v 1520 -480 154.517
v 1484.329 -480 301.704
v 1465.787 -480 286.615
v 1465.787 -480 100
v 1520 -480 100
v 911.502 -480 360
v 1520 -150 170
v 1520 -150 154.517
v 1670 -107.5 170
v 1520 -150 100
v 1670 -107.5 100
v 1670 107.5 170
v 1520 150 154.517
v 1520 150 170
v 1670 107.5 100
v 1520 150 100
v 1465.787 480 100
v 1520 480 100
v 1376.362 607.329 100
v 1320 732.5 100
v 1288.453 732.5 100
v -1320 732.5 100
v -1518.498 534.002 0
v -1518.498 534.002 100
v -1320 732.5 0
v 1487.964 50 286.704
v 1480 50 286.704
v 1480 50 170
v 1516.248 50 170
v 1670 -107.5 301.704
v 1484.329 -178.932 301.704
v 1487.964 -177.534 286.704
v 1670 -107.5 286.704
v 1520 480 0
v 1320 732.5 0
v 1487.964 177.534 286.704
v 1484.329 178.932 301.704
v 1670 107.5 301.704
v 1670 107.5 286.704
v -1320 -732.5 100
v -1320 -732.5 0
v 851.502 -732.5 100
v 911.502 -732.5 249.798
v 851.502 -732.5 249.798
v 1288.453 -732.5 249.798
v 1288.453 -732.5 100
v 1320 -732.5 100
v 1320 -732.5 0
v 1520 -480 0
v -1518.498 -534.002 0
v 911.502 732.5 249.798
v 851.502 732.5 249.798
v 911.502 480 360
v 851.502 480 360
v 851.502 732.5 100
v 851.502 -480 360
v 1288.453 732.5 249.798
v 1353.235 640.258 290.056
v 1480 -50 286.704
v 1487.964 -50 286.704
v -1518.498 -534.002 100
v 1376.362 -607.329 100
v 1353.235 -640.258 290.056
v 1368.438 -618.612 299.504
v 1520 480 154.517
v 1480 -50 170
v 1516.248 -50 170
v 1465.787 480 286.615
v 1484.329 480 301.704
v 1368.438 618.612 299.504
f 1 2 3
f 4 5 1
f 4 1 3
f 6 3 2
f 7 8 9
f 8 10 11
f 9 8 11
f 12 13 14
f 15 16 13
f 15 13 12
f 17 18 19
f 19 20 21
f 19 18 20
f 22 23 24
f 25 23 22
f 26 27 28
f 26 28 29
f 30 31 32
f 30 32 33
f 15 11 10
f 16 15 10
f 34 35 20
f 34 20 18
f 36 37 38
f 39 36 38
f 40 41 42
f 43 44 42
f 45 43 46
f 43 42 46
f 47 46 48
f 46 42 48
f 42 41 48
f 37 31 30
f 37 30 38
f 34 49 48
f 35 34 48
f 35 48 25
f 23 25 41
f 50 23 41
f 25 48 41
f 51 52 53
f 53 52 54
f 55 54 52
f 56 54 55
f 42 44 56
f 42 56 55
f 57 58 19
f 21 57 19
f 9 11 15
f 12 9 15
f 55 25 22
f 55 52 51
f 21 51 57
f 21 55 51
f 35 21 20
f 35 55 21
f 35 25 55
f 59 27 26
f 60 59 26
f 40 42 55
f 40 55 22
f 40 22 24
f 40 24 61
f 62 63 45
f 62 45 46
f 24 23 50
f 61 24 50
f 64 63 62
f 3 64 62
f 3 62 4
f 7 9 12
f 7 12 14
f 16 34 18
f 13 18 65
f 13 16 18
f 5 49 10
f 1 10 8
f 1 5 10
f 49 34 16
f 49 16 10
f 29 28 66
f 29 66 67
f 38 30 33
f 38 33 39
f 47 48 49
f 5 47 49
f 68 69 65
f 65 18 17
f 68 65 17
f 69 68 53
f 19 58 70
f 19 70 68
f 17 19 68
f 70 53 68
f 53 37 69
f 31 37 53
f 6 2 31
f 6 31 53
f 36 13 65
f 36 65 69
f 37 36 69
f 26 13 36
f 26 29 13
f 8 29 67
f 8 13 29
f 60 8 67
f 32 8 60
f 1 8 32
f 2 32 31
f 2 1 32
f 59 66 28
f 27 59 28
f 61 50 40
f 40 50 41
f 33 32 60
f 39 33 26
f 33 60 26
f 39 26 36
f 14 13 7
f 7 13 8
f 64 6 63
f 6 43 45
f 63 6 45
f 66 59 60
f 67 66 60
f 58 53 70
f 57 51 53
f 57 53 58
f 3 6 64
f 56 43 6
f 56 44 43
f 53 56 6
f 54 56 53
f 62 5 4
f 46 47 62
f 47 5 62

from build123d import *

# Parameters (mm, degrees)
BOSS_EXTRUDE1_DEPTH = 100
BOSS_EXTRUDE2_DEPTH = 30
BOSS_EXTRUDE3_DEPTH = 480
BOSS_EXTRUDE6_DEPTH = 70
BOSS_EXTRUDE7_DEPTH = 15
BOSS_EXTRUDE8_DEPTH = 252.5
BOSS_EXTRUDE9_REACH = 262
SKETCH15_W          = 587.219841395
SKETCH15_H          = 796.289062858
CUT_EXTRUDE1_DEPTH  = 400
SKETCH17_W          = 242.752536278
SKETCH17_H          = 431.304427501
CUT_EXTRUDE2_DEPTH  = 150
SKETCH18_W          = 4260.921249802
SKETCH18_H          = 1605.776736753
CUT_EXTRUDE3_DEPTH  = 1872
SKETCH19_W          = 40
SKETCH19_H          = 100
CUT_EXTRUDE4_DEPTH  = 116.703964


with BuildPart() as part:
    # Sketch1 → Boss-Extrude1 (new body)
    with BuildSketch(Plane.XY):
        Polygon((-1320, -732.5), (-1518.49827194, -534.00172806), (-1518.49827194, 534.00172806), (-1320, 732.5), (1320, 732.5), (1520, 480), (1520, -480), (1320, -732.5), align=None)
    extrude(amount=BOSS_EXTRUDE1_DEPTH)

    # Sketch2 → Boss-Extrude2 (add, symmetric)
    with BuildSketch(Plane.ZY.offset(-881.50172806)):
        Polygon((100, 732.5), (249.797915184, 732.5), (360, 480), (360, -480), (249.797915184, -732.5), (100, -732.5), align=None)
    extrude(amount=BOSS_EXTRUDE2_DEPTH, both=True)

    # Sketch3 → Boss-Extrude3 (add, symmetric)
    with BuildSketch(Plane(origin=(0, 0, 0), x_dir=(1, 0, 0), z_dir=(0, 1, 0))):
        Polygon((1520, -100), (1520, -154.516976287), (1484.328596942, -301.703964205), (911.50172806, -360), (911.50172806, -100), align=None)
    extrude(amount=BOSS_EXTRUDE3_DEPTH, both=True)

    # Sketch10 → Boss-Extrude6 (add)
    with BuildSketch(Plane.XY.offset(100)):
        Polygon((1520, 150), (1670, 107.5), (1670, -107.5), (1520, -150), align=None)
    extrude(amount=BOSS_EXTRUDE6_DEPTH)

    # Sketch11 → Boss-Extrude7 (add)
    with BuildSketch(Plane(origin=(0, 0, 301.703964205), x_dir=(0, -1, 0), z_dir=(0, 0, -1))):
        Polygon((-178.932312311, -1484.328596942), (-107.5, -1670), (107.5, -1670), (159.754145476, -1484.328596942), align=None)
    extrude(amount=BOSS_EXTRUDE7_DEPTH)

    # Sketch14 → Boss-Extrude8 (add)
    with BuildSketch(Plane(origin=(0, 732.5, 0), x_dir=(1, 0, 0), z_dir=(0, 1, 0))):
        Polygon((911.50172806, -100), (911.50172806, -360), (1351.817776589, -301.703964205), (1376.361738529, -100), align=None)
    extrude(amount=-BOSS_EXTRUDE8_DEPTH)

    # Boss-Extrude9: up to this face of the body (flat: up to its plane)
    boss_extrude9_end = Plane(part.part.faces().sort_by_distance((1131.659752325, 606.25, 330.851982103))[0])
    # Sketch16 → Boss-Extrude9 (add, up to the picked face)
    with BuildSketch(Plane.XY.offset(100), mode=Mode.PRIVATE) as boss_extrude9_sk1:
        Polygon((1329.450960679, 674.123815603), (1465.786632852, 480), (1329.450960679, 480), align=None)
    boss_extrude9_tool1 = split(extrude(boss_extrude9_sk1.sketch, amount=BOSS_EXTRUDE9_REACH, mode=Mode.PRIVATE), bisect_by=boss_extrude9_end, keep=Keep.BOTH, mode=Mode.PRIVATE)
    add(boss_extrude9_tool1.solids().sort_by_distance((1374.896185, 544.707939, 100))[0])

    # Sketch15 → Cut-Extrude1 (cut)
    with BuildSketch(Plane(origin=(0, 208.782250156, 478.371332562), x_dir=(1, 0, 0), z_dir=(0, 0.400006251, 0.916512411))):
        with Locations((1205.111648758, 435.889549234)):
            Rectangle(SKETCH15_W, SKETCH15_H)
    extrude(amount=CUT_EXTRUDE1_DEPTH, mode=Mode.SUBTRACT)

    # Sketch17 → Cut-Extrude2 (cut)
    with BuildSketch(Plane(origin=(1207.369633426, 847.951344984, 0), x_dir=(0, 0, -1), z_dir=(0.818341703, 0.574731987, 0))):
        with Locations((-221.376268139, -212.999290638)):
            Rectangle(SKETCH17_W, SKETCH17_H)
    extrude(amount=CUT_EXTRUDE2_DEPTH, mode=Mode.SUBTRACT)

    # Sketch18 → Cut-Extrude3 (cut)
    with BuildSketch(Plane(origin=(0, 0, 0), x_dir=(1, 0, 0), z_dir=(0, 1, 0))):
        with Locations((45.70135603, -435.455529715)):
            Rectangle(SKETCH18_W, SKETCH18_H)
    extrude(amount=-CUT_EXTRUDE3_DEPTH, mode=Mode.SUBTRACT)

    # Mirror1: part across plane


with BuildPart() as part_1:
    add(part.part)
    add(part.part.mirror(Plane.ZX))

    # Sketch19 → Cut-Extrude4 (cut)
    with BuildSketch(Plane.XY.offset(170)):
        with Locations((1500, 0)):
            Rectangle(SKETCH19_W, SKETCH19_H)
    extrude(amount=CUT_EXTRUDE4_DEPTH, mode=Mode.SUBTRACT)


solid = part_1.part
